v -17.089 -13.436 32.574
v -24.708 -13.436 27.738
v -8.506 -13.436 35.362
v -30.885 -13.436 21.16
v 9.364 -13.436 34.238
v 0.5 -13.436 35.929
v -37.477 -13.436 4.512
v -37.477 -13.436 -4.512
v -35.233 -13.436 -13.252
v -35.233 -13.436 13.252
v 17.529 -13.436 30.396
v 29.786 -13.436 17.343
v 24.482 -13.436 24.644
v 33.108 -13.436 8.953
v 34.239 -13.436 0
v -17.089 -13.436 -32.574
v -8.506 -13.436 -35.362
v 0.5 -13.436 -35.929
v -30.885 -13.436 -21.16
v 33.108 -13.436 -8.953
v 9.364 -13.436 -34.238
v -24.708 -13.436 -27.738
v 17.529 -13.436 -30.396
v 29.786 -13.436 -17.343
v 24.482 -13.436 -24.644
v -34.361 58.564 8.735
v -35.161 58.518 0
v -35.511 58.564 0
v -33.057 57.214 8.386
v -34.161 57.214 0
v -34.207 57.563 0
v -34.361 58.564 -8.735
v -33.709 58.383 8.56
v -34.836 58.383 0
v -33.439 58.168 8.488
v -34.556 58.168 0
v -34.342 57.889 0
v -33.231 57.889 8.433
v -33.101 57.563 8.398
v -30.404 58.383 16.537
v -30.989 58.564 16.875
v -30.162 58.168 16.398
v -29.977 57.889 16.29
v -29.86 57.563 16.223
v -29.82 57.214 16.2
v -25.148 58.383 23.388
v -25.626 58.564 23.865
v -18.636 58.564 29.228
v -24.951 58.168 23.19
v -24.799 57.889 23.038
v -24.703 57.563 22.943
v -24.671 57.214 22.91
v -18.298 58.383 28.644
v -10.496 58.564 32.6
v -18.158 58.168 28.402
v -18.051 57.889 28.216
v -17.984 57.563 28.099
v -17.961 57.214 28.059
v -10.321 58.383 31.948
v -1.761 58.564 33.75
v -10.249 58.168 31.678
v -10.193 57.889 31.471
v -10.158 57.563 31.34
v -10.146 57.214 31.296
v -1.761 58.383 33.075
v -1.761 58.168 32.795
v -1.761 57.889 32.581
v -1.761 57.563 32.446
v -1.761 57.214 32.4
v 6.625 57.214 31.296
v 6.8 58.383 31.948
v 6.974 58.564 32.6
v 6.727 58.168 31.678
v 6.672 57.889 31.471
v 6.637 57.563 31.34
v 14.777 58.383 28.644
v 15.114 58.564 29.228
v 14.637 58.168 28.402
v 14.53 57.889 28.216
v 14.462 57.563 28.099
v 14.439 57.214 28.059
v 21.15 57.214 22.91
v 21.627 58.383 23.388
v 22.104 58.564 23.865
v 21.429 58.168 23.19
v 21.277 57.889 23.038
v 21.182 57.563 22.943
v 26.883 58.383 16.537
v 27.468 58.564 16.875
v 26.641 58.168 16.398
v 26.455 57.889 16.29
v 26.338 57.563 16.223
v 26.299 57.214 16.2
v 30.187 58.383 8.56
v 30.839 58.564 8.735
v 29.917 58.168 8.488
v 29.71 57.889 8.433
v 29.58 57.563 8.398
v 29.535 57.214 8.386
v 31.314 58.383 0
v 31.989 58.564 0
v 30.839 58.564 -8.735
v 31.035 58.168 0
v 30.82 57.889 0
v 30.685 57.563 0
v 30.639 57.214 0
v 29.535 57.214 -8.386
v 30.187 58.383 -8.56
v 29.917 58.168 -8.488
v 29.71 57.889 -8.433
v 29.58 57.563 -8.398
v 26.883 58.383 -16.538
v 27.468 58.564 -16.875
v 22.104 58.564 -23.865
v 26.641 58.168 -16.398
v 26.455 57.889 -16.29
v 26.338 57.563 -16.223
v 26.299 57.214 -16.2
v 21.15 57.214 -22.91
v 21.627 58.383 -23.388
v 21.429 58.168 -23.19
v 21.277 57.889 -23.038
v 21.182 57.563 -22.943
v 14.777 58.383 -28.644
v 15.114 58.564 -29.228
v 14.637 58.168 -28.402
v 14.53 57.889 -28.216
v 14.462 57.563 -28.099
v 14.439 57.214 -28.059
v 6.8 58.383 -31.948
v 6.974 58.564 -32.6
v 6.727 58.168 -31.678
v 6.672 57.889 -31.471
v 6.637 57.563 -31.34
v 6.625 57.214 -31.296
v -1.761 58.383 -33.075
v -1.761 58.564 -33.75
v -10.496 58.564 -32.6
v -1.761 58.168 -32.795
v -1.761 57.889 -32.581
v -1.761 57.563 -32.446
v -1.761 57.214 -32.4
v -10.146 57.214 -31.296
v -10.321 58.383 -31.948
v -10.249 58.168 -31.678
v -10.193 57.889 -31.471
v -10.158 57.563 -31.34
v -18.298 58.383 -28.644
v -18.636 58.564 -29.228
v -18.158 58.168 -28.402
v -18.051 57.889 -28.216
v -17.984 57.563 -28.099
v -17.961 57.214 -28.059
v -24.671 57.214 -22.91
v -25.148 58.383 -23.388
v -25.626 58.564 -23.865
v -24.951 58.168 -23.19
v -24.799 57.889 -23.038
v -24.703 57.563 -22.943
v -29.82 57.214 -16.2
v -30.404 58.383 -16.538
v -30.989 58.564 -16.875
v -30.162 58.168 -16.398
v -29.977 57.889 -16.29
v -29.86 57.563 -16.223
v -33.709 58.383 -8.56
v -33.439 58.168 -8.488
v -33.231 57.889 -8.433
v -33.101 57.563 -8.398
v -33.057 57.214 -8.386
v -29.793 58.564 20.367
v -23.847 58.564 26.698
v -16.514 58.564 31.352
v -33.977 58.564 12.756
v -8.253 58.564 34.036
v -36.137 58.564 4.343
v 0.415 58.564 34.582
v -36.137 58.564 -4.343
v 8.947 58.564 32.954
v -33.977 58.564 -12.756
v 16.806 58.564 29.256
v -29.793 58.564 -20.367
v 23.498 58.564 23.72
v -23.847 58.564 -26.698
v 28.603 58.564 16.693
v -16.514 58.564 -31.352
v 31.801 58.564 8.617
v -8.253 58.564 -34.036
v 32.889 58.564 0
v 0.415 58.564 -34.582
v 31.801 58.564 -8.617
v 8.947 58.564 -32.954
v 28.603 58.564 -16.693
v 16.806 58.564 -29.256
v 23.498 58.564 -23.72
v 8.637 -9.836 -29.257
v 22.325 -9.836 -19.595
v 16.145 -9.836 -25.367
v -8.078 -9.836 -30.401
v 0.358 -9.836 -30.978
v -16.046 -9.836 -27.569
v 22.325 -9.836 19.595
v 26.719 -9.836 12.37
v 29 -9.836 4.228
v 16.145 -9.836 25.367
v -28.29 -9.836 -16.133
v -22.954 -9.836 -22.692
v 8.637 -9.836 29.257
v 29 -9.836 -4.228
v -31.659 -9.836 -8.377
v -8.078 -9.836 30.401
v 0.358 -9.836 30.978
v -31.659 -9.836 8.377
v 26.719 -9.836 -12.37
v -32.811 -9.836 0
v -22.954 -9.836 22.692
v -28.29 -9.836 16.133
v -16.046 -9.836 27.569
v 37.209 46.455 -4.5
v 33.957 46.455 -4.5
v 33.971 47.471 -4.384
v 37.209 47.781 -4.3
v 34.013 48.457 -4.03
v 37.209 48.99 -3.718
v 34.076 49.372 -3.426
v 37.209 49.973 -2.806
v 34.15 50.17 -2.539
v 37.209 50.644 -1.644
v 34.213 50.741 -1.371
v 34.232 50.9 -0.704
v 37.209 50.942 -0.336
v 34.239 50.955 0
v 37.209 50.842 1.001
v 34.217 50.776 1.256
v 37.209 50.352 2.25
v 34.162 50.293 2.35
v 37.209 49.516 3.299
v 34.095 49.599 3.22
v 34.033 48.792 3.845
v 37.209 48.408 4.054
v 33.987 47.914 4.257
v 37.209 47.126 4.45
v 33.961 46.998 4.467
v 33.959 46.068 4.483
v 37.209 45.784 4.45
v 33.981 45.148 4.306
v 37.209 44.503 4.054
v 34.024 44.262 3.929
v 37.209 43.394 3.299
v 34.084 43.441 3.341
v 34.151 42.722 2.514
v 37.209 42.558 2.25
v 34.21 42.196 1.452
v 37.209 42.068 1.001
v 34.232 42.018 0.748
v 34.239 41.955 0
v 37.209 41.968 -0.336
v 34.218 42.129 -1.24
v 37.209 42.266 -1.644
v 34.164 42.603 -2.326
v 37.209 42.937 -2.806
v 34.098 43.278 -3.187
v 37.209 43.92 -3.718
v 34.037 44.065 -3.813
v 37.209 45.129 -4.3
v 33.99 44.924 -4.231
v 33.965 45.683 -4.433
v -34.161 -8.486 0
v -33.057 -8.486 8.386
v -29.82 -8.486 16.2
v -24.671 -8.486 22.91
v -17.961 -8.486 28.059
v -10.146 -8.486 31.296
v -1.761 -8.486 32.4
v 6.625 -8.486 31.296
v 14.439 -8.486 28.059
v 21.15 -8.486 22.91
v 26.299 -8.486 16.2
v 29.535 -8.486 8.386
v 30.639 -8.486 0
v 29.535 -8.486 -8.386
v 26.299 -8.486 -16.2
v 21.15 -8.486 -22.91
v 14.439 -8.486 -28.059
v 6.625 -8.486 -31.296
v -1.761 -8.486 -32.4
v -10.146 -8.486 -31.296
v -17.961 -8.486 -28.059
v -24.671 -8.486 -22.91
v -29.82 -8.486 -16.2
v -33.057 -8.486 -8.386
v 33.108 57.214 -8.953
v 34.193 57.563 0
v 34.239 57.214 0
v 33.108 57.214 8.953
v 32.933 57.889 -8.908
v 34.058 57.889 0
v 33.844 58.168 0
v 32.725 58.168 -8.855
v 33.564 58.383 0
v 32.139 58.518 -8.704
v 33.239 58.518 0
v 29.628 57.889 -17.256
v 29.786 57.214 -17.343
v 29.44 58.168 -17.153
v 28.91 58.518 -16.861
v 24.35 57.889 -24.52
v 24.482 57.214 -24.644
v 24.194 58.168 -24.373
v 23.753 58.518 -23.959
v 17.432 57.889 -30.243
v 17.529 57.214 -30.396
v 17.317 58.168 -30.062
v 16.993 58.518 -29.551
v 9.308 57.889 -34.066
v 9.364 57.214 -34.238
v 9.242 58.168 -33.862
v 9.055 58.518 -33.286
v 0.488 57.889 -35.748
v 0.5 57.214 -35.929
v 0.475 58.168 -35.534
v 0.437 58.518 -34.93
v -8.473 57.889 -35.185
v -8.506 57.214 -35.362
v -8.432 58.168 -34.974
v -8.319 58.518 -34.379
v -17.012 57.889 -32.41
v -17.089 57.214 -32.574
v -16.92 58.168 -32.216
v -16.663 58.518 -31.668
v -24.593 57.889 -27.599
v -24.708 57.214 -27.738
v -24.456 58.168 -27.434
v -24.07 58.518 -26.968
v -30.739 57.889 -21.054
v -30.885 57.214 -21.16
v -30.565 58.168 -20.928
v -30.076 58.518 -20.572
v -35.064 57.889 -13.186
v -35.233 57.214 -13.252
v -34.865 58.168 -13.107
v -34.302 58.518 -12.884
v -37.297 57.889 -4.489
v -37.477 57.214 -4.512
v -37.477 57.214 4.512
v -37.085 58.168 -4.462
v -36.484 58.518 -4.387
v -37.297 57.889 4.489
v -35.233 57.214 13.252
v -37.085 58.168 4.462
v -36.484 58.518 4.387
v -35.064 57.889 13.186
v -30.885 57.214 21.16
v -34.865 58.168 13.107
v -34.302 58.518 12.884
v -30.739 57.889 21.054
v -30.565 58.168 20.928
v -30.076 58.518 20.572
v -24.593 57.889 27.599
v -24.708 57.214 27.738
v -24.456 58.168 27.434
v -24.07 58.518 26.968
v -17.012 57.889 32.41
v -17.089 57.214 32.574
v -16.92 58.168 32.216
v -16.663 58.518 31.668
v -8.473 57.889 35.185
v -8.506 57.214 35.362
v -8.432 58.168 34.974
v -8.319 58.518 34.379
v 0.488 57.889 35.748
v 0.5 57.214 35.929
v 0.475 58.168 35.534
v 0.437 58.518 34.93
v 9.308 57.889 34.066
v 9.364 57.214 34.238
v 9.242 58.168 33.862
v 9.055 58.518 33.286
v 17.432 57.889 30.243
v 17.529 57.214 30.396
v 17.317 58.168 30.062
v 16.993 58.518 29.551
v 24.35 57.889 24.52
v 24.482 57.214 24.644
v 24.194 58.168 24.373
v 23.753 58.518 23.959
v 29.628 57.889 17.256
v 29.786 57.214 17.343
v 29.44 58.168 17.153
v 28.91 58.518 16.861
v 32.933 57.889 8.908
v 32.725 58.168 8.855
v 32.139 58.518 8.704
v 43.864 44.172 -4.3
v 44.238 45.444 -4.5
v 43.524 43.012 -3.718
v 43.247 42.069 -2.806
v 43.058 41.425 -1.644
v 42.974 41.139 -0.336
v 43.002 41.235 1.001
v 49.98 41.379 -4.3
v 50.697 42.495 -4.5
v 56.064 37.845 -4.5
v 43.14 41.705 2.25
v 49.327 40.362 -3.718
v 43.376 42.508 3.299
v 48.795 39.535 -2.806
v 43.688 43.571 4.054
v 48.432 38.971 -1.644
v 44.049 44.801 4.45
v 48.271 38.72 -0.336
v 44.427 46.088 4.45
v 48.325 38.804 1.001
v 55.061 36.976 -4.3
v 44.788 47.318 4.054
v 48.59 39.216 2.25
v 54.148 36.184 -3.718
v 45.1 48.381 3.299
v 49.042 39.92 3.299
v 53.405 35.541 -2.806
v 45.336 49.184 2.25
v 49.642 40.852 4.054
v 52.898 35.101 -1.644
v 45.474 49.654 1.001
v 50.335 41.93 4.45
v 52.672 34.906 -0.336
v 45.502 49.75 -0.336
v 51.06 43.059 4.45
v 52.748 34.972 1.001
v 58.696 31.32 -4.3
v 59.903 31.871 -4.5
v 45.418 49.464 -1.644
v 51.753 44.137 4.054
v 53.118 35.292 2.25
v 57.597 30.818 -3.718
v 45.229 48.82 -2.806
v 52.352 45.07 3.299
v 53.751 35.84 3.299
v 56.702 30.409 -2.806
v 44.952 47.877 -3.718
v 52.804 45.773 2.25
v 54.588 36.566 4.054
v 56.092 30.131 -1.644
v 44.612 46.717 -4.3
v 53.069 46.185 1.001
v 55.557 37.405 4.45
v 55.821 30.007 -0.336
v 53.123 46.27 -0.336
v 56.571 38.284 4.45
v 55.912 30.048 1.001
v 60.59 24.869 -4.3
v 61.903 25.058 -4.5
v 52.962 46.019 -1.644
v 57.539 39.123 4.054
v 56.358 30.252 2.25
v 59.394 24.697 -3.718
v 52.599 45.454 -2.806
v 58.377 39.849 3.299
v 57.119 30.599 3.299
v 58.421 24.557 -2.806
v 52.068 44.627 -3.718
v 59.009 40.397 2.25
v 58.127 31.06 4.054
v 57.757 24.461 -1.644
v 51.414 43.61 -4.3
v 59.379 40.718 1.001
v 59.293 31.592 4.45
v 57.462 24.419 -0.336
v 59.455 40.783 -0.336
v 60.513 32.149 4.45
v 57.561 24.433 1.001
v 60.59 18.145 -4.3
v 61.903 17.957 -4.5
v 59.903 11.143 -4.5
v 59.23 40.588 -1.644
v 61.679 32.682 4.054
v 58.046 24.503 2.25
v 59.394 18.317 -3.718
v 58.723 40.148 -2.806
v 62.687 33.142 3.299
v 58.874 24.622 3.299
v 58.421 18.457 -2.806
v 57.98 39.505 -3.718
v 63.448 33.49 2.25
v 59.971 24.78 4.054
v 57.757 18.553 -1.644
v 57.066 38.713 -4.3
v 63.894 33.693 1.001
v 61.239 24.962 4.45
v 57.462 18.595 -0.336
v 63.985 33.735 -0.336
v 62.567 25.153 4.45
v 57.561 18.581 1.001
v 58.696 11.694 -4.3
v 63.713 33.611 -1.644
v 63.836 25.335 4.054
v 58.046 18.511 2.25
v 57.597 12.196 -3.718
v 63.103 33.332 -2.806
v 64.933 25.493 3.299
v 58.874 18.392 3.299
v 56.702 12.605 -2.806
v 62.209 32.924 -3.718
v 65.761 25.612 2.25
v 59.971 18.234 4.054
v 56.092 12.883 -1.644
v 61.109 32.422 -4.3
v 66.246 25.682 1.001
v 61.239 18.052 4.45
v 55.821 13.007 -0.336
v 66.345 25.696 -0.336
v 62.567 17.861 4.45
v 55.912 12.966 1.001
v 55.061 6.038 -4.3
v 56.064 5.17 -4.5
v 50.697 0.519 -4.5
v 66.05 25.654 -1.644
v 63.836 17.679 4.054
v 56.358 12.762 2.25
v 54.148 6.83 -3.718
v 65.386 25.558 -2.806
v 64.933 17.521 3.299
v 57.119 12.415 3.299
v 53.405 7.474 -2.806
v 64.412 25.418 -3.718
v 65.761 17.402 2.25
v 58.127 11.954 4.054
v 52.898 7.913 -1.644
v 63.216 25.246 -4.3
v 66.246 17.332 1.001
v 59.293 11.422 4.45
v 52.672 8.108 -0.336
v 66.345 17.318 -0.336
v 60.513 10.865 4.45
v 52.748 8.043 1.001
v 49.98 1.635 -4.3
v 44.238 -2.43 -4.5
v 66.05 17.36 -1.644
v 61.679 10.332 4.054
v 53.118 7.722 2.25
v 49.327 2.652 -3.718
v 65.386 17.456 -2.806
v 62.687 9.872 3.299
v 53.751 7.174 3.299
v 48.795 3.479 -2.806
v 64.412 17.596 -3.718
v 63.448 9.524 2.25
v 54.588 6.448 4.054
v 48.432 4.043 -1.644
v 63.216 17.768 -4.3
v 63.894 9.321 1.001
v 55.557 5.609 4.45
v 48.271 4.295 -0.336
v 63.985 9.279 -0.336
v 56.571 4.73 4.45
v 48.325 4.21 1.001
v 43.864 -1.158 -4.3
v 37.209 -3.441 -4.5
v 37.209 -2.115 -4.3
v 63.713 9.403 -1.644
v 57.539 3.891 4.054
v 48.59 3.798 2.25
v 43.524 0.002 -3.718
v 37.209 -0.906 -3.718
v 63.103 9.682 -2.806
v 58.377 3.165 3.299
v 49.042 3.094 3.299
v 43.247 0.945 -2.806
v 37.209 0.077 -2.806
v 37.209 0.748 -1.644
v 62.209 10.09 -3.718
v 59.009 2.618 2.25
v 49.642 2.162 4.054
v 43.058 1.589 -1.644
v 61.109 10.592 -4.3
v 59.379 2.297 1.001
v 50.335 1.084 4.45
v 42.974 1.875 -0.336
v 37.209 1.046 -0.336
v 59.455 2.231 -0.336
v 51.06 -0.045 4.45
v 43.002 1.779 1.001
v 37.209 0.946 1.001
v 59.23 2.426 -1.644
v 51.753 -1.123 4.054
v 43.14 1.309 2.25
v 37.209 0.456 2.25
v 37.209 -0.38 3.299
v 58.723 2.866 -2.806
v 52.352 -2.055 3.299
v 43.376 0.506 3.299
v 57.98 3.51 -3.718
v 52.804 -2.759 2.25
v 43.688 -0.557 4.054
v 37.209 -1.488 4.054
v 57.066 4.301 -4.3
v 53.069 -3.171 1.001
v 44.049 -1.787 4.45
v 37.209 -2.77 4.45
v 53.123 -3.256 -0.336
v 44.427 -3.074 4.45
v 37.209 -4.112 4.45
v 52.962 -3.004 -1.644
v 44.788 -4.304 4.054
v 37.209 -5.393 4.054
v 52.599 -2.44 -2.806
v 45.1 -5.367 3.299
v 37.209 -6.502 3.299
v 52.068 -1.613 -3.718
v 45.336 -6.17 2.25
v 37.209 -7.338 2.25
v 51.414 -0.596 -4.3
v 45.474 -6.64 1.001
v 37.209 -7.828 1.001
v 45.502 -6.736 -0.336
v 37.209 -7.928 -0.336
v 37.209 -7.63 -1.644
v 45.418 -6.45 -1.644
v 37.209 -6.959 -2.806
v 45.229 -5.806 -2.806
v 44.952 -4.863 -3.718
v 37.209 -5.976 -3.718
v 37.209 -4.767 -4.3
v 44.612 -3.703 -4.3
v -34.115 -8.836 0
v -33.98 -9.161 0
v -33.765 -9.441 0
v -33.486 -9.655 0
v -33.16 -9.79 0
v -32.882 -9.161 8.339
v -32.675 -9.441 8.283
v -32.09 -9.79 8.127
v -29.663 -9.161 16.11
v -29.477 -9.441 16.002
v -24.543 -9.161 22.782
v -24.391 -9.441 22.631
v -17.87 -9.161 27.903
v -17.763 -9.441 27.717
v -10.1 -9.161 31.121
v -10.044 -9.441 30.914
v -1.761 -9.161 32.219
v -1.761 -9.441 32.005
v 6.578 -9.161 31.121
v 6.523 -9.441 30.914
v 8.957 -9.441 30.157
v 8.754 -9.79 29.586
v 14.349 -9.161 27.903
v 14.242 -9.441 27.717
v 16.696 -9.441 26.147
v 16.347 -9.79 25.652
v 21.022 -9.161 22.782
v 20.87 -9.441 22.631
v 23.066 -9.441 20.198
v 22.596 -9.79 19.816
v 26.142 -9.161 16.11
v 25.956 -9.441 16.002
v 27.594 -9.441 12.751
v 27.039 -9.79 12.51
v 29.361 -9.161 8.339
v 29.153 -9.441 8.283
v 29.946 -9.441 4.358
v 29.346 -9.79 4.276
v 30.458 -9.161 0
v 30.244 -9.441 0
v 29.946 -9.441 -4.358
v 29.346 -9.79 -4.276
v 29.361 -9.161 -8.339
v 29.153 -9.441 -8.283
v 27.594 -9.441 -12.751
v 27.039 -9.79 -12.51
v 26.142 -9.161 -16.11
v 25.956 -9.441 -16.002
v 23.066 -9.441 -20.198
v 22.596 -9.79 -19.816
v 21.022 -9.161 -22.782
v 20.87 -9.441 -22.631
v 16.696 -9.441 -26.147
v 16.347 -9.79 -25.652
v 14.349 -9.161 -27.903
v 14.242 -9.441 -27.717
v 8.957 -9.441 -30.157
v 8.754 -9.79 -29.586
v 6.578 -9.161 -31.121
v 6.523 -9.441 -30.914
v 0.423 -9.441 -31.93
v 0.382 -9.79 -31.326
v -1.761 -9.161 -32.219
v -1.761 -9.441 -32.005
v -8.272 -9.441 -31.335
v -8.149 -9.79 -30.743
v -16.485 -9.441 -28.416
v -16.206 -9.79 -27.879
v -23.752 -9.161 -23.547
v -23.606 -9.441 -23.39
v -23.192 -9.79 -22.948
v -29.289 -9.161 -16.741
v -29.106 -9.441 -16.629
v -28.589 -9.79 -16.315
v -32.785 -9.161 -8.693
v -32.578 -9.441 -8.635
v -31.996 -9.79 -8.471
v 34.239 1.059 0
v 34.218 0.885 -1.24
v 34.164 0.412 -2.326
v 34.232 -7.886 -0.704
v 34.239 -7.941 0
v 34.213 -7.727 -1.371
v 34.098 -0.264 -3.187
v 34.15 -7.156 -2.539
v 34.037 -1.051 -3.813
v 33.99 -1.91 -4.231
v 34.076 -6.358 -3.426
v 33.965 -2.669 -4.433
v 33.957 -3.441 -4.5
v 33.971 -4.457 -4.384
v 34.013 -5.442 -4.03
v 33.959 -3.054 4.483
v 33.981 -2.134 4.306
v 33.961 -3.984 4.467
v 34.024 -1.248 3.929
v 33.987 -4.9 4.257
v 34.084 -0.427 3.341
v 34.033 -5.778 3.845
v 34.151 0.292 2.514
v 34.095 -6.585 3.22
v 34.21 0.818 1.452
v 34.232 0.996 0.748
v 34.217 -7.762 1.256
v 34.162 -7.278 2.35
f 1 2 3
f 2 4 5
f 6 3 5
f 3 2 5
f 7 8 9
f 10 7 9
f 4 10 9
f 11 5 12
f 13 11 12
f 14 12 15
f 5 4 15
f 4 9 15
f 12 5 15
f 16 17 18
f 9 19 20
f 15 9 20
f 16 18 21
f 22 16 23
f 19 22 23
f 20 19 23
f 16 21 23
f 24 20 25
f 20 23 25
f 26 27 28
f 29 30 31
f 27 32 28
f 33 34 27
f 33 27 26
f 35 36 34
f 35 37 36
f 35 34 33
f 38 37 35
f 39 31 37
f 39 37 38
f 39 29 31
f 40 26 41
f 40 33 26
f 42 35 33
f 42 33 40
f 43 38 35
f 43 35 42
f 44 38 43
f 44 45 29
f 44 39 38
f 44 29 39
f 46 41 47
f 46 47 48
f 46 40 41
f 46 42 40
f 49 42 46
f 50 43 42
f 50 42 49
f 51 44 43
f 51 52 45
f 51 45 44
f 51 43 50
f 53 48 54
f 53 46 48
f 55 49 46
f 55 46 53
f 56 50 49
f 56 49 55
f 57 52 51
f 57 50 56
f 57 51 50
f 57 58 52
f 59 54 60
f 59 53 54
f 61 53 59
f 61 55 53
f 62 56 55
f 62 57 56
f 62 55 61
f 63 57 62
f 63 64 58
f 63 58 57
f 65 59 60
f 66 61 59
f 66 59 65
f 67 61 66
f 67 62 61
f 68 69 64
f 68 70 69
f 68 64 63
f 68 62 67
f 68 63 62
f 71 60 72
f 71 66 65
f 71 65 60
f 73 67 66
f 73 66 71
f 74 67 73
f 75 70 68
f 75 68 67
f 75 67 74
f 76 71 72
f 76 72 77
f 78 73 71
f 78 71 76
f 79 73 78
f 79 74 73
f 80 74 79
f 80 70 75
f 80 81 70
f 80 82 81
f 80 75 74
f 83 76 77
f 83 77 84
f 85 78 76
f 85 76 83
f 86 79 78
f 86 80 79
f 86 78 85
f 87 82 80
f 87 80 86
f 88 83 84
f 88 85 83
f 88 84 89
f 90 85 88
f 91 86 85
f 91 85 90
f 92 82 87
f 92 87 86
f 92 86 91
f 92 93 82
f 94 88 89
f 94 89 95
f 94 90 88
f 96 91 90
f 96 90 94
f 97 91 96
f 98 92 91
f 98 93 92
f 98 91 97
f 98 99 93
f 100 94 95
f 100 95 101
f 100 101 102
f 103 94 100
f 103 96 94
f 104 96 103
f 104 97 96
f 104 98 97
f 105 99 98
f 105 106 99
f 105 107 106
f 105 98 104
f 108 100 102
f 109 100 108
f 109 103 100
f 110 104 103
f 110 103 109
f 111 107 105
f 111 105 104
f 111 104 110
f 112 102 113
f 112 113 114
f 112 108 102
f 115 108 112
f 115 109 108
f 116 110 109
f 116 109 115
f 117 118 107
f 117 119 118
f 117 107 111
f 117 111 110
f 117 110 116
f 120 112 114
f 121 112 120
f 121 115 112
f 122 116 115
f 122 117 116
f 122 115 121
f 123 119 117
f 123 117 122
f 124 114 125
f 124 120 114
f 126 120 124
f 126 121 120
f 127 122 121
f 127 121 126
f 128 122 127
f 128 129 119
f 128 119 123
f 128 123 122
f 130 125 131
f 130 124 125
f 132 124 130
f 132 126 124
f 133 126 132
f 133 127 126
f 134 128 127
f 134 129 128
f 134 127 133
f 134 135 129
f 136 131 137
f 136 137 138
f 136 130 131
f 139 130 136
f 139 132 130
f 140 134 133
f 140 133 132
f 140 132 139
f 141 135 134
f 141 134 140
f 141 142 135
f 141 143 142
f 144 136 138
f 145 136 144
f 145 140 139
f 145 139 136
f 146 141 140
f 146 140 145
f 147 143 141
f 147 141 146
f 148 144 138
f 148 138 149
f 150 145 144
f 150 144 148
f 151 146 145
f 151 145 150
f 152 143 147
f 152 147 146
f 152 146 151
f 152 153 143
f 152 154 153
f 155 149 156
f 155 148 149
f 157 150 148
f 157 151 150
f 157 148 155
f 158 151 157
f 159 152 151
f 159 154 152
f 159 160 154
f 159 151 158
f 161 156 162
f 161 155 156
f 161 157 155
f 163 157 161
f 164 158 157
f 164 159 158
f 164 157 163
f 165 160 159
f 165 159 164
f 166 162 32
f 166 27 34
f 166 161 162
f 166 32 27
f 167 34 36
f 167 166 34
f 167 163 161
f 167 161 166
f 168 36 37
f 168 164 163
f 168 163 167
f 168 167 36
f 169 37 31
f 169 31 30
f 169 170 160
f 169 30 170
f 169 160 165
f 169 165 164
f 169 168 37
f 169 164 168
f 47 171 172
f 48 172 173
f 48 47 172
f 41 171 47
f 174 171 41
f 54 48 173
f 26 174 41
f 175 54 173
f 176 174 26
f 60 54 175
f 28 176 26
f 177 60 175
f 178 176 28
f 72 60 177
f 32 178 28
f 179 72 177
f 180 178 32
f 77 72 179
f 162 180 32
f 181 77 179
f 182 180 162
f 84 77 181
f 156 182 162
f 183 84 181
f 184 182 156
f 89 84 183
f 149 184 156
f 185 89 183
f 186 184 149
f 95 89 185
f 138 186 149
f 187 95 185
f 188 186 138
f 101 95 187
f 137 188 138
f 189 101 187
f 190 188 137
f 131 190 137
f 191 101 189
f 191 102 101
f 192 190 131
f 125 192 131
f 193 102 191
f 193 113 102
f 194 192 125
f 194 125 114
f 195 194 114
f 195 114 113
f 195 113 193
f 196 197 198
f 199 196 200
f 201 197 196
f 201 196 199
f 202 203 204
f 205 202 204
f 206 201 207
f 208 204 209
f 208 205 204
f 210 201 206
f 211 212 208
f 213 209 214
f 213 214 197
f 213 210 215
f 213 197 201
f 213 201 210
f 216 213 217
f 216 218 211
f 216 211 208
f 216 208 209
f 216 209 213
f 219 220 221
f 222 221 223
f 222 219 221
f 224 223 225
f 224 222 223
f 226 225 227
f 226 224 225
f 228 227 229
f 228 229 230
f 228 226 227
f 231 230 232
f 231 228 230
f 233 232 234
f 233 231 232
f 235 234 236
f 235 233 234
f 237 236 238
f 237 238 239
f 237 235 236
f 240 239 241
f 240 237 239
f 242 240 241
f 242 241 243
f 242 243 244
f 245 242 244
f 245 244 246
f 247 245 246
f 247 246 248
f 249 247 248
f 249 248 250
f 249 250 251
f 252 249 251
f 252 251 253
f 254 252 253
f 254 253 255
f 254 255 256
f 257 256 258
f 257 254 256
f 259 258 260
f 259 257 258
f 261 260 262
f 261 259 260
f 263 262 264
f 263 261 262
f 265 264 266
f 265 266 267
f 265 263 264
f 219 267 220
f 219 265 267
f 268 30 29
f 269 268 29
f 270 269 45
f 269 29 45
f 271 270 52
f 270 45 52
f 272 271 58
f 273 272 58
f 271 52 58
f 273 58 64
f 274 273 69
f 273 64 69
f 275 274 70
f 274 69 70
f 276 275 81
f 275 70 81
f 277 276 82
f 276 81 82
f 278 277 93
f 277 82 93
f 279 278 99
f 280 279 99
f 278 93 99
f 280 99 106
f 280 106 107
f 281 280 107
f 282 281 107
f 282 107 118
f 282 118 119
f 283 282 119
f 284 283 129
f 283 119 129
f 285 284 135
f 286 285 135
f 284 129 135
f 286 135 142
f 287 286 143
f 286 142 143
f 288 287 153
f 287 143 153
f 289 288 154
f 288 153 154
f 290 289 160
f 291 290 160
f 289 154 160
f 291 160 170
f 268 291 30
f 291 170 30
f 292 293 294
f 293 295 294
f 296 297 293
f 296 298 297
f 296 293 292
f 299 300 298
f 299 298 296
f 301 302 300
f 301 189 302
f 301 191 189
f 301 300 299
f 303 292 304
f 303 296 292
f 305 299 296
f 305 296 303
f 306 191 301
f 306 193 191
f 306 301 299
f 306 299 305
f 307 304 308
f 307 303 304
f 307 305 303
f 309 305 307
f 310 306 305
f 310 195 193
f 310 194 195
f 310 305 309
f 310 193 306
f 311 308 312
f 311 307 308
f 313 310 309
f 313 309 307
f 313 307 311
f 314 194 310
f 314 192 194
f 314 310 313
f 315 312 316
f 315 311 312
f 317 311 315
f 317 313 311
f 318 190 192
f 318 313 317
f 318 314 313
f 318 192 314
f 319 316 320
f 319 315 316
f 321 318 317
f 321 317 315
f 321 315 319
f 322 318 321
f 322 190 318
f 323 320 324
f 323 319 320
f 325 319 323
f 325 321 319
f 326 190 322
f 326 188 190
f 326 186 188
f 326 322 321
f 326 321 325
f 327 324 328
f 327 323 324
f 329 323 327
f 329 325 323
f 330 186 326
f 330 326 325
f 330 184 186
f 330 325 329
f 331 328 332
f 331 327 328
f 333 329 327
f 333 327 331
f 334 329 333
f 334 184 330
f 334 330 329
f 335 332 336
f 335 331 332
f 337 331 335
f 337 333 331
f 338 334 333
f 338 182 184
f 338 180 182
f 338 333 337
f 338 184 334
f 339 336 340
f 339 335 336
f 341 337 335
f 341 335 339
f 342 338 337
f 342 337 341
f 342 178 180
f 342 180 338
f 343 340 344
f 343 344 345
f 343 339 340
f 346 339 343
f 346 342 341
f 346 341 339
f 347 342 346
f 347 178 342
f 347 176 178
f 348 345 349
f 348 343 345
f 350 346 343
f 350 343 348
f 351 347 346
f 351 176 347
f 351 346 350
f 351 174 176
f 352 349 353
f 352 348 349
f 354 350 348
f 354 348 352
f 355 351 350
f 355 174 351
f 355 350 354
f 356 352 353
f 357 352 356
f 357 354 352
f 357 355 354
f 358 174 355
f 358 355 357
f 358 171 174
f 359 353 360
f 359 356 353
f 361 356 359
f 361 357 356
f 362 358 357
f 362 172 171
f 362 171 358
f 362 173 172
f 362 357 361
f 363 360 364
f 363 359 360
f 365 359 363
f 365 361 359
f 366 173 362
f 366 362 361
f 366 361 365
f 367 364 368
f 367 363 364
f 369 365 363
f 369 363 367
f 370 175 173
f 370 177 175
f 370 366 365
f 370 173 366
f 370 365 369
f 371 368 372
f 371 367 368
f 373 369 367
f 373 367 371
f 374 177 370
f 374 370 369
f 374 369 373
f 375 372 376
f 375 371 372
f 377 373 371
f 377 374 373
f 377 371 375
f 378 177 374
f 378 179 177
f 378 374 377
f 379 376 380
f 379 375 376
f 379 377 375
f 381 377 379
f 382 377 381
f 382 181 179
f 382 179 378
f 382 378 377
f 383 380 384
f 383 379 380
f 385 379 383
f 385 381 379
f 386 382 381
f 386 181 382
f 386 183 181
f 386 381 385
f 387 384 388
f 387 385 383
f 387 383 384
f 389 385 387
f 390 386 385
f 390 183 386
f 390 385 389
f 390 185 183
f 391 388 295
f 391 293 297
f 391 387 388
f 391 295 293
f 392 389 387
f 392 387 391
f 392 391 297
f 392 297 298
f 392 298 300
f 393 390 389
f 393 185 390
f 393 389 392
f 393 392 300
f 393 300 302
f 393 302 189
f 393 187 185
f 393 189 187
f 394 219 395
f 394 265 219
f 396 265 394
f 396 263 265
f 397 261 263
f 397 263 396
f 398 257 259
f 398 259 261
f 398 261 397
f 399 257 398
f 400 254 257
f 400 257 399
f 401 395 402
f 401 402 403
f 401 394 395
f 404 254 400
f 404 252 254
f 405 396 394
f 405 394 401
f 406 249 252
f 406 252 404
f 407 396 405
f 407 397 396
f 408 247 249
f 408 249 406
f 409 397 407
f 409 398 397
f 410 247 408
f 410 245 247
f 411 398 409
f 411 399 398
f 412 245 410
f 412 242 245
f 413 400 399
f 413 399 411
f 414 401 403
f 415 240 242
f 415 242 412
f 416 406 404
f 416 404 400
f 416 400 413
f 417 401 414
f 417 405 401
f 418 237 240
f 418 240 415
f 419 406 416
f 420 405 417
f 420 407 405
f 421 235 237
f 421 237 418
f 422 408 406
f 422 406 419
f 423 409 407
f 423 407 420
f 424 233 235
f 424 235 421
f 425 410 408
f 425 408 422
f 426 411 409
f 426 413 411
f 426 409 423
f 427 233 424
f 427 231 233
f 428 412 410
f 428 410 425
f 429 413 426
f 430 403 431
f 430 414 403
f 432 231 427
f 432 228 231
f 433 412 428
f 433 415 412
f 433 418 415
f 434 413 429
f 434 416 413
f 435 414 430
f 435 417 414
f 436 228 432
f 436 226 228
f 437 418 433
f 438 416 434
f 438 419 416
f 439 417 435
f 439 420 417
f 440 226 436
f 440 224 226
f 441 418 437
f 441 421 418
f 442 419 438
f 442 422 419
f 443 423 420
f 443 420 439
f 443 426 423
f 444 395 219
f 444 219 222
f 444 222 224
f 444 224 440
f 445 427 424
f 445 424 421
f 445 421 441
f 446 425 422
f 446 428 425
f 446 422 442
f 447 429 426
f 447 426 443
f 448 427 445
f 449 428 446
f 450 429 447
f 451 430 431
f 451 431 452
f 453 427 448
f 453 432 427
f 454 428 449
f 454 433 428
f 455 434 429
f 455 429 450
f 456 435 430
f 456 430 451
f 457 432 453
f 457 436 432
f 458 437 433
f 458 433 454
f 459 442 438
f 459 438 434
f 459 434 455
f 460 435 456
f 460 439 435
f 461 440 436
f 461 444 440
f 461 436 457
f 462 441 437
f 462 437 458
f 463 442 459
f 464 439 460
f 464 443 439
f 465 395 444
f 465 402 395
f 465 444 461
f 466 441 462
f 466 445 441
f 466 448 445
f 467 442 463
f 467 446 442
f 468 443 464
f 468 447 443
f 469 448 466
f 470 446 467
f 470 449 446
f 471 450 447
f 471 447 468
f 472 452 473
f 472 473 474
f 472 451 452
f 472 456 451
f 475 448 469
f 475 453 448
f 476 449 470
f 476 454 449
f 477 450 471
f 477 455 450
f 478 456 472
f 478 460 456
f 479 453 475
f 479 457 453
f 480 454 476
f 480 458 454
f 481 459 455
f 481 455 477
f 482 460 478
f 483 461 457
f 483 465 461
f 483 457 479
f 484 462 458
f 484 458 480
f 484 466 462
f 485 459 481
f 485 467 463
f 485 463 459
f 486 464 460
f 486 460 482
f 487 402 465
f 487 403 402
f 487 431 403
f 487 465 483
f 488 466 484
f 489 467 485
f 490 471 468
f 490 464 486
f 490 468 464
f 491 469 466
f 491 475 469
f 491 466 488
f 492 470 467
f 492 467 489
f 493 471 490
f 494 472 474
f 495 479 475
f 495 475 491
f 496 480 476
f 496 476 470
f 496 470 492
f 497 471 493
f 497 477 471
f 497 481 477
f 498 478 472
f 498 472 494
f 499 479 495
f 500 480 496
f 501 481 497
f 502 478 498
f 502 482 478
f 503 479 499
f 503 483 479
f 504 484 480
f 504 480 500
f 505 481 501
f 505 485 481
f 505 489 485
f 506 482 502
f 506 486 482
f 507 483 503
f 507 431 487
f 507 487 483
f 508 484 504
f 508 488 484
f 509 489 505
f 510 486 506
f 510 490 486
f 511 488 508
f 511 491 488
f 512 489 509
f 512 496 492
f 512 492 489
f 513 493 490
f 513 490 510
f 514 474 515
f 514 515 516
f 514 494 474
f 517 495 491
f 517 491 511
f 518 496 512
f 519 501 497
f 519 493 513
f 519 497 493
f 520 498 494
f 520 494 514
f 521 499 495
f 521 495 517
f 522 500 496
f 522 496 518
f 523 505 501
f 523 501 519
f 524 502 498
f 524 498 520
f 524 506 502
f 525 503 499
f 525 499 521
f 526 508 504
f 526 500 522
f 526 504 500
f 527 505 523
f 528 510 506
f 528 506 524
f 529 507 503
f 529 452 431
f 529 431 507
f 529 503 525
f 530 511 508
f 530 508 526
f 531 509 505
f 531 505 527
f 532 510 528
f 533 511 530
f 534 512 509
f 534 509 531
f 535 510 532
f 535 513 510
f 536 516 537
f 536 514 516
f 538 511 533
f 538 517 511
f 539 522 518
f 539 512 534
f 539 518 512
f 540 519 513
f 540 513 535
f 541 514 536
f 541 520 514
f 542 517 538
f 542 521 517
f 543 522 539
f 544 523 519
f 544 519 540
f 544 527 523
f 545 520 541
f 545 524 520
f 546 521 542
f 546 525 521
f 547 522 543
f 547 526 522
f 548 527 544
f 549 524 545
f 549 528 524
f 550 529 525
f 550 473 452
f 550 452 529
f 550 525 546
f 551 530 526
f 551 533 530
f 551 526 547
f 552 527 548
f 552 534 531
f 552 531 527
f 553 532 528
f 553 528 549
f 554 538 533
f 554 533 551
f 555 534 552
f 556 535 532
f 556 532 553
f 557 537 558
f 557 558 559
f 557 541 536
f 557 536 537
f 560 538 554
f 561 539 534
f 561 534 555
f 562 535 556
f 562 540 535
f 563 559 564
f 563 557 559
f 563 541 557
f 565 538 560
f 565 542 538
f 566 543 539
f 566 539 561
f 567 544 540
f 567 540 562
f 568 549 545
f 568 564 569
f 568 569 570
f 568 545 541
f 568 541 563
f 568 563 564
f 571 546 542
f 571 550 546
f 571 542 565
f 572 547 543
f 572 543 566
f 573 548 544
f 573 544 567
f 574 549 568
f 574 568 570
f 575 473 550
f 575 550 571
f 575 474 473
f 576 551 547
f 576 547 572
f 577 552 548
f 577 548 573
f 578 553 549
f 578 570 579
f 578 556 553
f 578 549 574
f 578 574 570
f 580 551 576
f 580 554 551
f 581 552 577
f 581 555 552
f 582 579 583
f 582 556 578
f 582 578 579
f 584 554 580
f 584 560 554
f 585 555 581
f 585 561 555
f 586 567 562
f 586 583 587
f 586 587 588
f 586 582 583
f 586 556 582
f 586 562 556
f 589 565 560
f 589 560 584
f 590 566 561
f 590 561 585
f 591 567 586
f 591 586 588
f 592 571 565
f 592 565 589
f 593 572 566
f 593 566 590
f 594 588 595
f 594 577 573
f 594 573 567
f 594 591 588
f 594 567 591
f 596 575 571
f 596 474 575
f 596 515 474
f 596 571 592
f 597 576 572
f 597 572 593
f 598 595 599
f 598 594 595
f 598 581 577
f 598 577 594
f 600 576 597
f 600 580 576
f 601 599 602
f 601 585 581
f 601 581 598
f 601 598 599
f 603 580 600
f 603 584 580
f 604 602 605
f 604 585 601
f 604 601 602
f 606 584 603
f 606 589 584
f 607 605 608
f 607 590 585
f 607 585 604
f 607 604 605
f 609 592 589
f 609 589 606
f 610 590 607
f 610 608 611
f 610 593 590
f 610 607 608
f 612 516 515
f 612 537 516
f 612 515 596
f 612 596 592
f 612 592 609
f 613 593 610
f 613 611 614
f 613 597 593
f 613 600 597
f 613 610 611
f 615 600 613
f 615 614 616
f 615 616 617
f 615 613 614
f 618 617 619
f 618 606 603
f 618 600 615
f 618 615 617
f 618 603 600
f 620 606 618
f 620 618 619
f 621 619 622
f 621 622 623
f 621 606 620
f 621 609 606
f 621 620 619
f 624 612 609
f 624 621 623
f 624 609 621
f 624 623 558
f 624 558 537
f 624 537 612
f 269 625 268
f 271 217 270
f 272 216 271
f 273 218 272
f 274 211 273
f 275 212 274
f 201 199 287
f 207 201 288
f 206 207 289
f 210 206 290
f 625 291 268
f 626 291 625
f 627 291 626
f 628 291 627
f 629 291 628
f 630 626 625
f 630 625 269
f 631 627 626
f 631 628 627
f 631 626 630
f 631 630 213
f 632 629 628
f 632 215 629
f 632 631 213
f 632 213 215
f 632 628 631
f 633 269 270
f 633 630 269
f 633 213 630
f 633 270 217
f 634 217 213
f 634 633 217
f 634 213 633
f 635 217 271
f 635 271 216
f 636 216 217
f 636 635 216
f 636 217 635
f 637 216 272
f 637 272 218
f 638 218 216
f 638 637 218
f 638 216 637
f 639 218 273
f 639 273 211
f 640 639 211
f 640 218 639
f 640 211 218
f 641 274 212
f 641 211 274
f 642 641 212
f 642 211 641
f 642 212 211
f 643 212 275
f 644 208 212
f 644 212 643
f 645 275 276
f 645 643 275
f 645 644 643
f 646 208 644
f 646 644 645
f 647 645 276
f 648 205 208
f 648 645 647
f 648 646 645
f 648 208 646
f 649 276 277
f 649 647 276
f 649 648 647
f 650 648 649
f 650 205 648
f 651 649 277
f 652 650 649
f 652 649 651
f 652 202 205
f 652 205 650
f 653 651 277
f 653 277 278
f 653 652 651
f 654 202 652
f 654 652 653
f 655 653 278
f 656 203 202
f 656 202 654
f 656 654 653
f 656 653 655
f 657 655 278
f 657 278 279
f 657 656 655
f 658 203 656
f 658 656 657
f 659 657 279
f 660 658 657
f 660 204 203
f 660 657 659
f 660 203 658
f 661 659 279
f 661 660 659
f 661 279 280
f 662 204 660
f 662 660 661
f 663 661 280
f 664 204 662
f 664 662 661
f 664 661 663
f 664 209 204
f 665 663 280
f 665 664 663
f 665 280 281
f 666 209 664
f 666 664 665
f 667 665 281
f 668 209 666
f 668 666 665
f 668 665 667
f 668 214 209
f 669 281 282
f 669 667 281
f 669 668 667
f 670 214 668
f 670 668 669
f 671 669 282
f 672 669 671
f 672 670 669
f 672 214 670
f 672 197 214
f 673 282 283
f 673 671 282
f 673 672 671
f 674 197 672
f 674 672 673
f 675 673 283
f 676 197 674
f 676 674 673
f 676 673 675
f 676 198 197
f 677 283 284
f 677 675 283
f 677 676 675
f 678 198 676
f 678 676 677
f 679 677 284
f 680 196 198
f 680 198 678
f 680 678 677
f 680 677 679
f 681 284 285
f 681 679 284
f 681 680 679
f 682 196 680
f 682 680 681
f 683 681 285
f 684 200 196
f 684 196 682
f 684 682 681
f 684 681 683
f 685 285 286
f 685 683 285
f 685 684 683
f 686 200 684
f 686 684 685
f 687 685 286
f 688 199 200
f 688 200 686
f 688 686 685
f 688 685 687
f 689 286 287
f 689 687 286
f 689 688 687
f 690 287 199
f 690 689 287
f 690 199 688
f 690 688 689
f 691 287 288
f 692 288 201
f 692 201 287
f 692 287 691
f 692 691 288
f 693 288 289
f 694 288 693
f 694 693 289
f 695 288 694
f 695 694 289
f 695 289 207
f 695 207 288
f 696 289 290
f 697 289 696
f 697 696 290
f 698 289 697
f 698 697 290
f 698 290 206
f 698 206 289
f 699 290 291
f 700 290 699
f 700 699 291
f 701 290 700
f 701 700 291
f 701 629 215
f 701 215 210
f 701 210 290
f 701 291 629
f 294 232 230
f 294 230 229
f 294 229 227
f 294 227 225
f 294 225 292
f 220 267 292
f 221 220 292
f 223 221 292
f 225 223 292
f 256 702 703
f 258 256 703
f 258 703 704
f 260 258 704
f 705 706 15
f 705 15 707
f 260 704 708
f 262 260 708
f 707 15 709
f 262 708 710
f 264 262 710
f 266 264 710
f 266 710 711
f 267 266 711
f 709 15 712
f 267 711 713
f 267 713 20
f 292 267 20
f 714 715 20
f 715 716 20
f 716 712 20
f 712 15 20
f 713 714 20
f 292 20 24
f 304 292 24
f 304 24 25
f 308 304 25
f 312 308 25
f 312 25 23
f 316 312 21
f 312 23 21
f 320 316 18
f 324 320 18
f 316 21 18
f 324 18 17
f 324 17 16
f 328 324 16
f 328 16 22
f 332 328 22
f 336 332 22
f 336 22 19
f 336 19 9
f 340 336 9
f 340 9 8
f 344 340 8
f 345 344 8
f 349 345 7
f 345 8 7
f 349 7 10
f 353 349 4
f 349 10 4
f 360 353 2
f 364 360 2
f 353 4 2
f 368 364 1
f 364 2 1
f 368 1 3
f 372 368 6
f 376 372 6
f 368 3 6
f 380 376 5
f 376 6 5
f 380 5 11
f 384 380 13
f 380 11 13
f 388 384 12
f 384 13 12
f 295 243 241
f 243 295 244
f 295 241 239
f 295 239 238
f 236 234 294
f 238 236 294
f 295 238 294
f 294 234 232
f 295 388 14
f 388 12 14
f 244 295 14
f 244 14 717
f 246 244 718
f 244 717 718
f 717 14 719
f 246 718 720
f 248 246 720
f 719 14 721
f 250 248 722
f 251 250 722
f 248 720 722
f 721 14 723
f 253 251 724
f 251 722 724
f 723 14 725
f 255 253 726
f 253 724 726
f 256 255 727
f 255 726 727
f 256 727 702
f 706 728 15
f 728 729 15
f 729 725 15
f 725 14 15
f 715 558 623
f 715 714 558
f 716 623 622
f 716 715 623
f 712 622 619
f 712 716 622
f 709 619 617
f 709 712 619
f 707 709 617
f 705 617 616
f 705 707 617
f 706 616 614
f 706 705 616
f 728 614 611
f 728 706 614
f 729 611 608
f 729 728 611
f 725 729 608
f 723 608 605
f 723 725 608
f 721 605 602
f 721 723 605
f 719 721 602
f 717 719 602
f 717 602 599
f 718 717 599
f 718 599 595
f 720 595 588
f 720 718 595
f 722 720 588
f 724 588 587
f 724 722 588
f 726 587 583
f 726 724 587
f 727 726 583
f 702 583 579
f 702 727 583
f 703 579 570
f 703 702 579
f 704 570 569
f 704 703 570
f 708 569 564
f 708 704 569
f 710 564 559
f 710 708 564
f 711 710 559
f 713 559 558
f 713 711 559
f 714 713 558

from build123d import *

# Parameters (mm, degrees)
SKETCH1_R          = 20
EXTRUDE1_DEPTH     = 40
SKETCH2_R          = 2.5
SKETCH4_R          = 18
CUT_EXTRUDE1_DEPTH = 38
FILLET1_R          = 0.75
FILLET2_R          = 0.75
SCALE2_SCALE       = 1.8


with BuildPart() as part:
    # Sketch1 → Extrude1 (new body)
    with BuildSketch(Plane(origin=(0, 0, 0), x_dir=(1, 0, 0), z_dir=(0, 1, 0))):
        Circle(SKETCH1_R)
    extrude(amount=EXTRUDE1_DEPTH)

    # Sweep1: sweep along a path in Sketch3
    with BuildLine(Plane.XY) as sweep1_path:
        Line((0, 30.773001508), (21.65, 30.773001508))
        ThreePointArc((21.65, 30.773001508), (33.01, 19.413001508), (21.65, 8.053001508))
        Line((21.65, 8.053001508), (0, 8.053001508))
    # Sketch2 → Sweep1 (sweep)
    with BuildSketch(Plane(origin=(0, 0, 0), x_dir=(0, 0, -1), z_dir=(1, 0, 0))):
        with Locations((0, 33.273001508)):
            Circle(SKETCH2_R)
    sweep(path=sweep1_path.line)

    # Sketch4 → Cut-Extrude1 (cut)
    with BuildSketch(Plane(origin=(0, 40, 0), x_dir=(-1, 0, 0), z_dir=(0, 1, 0))):
        Circle(SKETCH4_R)
    extrude(amount=-CUT_EXTRUDE1_DEPTH, mode=Mode.SUBTRACT)

    # Fillet1
    fillet1_edges = [part.edges().sort_by_distance(p)[0] for p in [
        (18, 40, 0),
        (-20, 40, 0),
    ]]
    fillet(fillet1_edges, radius=FILLET1_R)

    # Fillet2
    fillet2_edges = [part.edges().sort_by_distance(p)[0] for p in [
        (18, 2, 0),
    ]]
    fillet(fillet2_edges, radius=FILLET2_R)


with BuildPart() as part_1:
    # Scale2: scaled about (2.200885097, 16.795438051, 2.029e-06)
    add(part.part.scale(SCALE2_SCALE).moved(Location((-1.760708078, -13.436350441, -1.623e-06))))


solid = part_1.part
